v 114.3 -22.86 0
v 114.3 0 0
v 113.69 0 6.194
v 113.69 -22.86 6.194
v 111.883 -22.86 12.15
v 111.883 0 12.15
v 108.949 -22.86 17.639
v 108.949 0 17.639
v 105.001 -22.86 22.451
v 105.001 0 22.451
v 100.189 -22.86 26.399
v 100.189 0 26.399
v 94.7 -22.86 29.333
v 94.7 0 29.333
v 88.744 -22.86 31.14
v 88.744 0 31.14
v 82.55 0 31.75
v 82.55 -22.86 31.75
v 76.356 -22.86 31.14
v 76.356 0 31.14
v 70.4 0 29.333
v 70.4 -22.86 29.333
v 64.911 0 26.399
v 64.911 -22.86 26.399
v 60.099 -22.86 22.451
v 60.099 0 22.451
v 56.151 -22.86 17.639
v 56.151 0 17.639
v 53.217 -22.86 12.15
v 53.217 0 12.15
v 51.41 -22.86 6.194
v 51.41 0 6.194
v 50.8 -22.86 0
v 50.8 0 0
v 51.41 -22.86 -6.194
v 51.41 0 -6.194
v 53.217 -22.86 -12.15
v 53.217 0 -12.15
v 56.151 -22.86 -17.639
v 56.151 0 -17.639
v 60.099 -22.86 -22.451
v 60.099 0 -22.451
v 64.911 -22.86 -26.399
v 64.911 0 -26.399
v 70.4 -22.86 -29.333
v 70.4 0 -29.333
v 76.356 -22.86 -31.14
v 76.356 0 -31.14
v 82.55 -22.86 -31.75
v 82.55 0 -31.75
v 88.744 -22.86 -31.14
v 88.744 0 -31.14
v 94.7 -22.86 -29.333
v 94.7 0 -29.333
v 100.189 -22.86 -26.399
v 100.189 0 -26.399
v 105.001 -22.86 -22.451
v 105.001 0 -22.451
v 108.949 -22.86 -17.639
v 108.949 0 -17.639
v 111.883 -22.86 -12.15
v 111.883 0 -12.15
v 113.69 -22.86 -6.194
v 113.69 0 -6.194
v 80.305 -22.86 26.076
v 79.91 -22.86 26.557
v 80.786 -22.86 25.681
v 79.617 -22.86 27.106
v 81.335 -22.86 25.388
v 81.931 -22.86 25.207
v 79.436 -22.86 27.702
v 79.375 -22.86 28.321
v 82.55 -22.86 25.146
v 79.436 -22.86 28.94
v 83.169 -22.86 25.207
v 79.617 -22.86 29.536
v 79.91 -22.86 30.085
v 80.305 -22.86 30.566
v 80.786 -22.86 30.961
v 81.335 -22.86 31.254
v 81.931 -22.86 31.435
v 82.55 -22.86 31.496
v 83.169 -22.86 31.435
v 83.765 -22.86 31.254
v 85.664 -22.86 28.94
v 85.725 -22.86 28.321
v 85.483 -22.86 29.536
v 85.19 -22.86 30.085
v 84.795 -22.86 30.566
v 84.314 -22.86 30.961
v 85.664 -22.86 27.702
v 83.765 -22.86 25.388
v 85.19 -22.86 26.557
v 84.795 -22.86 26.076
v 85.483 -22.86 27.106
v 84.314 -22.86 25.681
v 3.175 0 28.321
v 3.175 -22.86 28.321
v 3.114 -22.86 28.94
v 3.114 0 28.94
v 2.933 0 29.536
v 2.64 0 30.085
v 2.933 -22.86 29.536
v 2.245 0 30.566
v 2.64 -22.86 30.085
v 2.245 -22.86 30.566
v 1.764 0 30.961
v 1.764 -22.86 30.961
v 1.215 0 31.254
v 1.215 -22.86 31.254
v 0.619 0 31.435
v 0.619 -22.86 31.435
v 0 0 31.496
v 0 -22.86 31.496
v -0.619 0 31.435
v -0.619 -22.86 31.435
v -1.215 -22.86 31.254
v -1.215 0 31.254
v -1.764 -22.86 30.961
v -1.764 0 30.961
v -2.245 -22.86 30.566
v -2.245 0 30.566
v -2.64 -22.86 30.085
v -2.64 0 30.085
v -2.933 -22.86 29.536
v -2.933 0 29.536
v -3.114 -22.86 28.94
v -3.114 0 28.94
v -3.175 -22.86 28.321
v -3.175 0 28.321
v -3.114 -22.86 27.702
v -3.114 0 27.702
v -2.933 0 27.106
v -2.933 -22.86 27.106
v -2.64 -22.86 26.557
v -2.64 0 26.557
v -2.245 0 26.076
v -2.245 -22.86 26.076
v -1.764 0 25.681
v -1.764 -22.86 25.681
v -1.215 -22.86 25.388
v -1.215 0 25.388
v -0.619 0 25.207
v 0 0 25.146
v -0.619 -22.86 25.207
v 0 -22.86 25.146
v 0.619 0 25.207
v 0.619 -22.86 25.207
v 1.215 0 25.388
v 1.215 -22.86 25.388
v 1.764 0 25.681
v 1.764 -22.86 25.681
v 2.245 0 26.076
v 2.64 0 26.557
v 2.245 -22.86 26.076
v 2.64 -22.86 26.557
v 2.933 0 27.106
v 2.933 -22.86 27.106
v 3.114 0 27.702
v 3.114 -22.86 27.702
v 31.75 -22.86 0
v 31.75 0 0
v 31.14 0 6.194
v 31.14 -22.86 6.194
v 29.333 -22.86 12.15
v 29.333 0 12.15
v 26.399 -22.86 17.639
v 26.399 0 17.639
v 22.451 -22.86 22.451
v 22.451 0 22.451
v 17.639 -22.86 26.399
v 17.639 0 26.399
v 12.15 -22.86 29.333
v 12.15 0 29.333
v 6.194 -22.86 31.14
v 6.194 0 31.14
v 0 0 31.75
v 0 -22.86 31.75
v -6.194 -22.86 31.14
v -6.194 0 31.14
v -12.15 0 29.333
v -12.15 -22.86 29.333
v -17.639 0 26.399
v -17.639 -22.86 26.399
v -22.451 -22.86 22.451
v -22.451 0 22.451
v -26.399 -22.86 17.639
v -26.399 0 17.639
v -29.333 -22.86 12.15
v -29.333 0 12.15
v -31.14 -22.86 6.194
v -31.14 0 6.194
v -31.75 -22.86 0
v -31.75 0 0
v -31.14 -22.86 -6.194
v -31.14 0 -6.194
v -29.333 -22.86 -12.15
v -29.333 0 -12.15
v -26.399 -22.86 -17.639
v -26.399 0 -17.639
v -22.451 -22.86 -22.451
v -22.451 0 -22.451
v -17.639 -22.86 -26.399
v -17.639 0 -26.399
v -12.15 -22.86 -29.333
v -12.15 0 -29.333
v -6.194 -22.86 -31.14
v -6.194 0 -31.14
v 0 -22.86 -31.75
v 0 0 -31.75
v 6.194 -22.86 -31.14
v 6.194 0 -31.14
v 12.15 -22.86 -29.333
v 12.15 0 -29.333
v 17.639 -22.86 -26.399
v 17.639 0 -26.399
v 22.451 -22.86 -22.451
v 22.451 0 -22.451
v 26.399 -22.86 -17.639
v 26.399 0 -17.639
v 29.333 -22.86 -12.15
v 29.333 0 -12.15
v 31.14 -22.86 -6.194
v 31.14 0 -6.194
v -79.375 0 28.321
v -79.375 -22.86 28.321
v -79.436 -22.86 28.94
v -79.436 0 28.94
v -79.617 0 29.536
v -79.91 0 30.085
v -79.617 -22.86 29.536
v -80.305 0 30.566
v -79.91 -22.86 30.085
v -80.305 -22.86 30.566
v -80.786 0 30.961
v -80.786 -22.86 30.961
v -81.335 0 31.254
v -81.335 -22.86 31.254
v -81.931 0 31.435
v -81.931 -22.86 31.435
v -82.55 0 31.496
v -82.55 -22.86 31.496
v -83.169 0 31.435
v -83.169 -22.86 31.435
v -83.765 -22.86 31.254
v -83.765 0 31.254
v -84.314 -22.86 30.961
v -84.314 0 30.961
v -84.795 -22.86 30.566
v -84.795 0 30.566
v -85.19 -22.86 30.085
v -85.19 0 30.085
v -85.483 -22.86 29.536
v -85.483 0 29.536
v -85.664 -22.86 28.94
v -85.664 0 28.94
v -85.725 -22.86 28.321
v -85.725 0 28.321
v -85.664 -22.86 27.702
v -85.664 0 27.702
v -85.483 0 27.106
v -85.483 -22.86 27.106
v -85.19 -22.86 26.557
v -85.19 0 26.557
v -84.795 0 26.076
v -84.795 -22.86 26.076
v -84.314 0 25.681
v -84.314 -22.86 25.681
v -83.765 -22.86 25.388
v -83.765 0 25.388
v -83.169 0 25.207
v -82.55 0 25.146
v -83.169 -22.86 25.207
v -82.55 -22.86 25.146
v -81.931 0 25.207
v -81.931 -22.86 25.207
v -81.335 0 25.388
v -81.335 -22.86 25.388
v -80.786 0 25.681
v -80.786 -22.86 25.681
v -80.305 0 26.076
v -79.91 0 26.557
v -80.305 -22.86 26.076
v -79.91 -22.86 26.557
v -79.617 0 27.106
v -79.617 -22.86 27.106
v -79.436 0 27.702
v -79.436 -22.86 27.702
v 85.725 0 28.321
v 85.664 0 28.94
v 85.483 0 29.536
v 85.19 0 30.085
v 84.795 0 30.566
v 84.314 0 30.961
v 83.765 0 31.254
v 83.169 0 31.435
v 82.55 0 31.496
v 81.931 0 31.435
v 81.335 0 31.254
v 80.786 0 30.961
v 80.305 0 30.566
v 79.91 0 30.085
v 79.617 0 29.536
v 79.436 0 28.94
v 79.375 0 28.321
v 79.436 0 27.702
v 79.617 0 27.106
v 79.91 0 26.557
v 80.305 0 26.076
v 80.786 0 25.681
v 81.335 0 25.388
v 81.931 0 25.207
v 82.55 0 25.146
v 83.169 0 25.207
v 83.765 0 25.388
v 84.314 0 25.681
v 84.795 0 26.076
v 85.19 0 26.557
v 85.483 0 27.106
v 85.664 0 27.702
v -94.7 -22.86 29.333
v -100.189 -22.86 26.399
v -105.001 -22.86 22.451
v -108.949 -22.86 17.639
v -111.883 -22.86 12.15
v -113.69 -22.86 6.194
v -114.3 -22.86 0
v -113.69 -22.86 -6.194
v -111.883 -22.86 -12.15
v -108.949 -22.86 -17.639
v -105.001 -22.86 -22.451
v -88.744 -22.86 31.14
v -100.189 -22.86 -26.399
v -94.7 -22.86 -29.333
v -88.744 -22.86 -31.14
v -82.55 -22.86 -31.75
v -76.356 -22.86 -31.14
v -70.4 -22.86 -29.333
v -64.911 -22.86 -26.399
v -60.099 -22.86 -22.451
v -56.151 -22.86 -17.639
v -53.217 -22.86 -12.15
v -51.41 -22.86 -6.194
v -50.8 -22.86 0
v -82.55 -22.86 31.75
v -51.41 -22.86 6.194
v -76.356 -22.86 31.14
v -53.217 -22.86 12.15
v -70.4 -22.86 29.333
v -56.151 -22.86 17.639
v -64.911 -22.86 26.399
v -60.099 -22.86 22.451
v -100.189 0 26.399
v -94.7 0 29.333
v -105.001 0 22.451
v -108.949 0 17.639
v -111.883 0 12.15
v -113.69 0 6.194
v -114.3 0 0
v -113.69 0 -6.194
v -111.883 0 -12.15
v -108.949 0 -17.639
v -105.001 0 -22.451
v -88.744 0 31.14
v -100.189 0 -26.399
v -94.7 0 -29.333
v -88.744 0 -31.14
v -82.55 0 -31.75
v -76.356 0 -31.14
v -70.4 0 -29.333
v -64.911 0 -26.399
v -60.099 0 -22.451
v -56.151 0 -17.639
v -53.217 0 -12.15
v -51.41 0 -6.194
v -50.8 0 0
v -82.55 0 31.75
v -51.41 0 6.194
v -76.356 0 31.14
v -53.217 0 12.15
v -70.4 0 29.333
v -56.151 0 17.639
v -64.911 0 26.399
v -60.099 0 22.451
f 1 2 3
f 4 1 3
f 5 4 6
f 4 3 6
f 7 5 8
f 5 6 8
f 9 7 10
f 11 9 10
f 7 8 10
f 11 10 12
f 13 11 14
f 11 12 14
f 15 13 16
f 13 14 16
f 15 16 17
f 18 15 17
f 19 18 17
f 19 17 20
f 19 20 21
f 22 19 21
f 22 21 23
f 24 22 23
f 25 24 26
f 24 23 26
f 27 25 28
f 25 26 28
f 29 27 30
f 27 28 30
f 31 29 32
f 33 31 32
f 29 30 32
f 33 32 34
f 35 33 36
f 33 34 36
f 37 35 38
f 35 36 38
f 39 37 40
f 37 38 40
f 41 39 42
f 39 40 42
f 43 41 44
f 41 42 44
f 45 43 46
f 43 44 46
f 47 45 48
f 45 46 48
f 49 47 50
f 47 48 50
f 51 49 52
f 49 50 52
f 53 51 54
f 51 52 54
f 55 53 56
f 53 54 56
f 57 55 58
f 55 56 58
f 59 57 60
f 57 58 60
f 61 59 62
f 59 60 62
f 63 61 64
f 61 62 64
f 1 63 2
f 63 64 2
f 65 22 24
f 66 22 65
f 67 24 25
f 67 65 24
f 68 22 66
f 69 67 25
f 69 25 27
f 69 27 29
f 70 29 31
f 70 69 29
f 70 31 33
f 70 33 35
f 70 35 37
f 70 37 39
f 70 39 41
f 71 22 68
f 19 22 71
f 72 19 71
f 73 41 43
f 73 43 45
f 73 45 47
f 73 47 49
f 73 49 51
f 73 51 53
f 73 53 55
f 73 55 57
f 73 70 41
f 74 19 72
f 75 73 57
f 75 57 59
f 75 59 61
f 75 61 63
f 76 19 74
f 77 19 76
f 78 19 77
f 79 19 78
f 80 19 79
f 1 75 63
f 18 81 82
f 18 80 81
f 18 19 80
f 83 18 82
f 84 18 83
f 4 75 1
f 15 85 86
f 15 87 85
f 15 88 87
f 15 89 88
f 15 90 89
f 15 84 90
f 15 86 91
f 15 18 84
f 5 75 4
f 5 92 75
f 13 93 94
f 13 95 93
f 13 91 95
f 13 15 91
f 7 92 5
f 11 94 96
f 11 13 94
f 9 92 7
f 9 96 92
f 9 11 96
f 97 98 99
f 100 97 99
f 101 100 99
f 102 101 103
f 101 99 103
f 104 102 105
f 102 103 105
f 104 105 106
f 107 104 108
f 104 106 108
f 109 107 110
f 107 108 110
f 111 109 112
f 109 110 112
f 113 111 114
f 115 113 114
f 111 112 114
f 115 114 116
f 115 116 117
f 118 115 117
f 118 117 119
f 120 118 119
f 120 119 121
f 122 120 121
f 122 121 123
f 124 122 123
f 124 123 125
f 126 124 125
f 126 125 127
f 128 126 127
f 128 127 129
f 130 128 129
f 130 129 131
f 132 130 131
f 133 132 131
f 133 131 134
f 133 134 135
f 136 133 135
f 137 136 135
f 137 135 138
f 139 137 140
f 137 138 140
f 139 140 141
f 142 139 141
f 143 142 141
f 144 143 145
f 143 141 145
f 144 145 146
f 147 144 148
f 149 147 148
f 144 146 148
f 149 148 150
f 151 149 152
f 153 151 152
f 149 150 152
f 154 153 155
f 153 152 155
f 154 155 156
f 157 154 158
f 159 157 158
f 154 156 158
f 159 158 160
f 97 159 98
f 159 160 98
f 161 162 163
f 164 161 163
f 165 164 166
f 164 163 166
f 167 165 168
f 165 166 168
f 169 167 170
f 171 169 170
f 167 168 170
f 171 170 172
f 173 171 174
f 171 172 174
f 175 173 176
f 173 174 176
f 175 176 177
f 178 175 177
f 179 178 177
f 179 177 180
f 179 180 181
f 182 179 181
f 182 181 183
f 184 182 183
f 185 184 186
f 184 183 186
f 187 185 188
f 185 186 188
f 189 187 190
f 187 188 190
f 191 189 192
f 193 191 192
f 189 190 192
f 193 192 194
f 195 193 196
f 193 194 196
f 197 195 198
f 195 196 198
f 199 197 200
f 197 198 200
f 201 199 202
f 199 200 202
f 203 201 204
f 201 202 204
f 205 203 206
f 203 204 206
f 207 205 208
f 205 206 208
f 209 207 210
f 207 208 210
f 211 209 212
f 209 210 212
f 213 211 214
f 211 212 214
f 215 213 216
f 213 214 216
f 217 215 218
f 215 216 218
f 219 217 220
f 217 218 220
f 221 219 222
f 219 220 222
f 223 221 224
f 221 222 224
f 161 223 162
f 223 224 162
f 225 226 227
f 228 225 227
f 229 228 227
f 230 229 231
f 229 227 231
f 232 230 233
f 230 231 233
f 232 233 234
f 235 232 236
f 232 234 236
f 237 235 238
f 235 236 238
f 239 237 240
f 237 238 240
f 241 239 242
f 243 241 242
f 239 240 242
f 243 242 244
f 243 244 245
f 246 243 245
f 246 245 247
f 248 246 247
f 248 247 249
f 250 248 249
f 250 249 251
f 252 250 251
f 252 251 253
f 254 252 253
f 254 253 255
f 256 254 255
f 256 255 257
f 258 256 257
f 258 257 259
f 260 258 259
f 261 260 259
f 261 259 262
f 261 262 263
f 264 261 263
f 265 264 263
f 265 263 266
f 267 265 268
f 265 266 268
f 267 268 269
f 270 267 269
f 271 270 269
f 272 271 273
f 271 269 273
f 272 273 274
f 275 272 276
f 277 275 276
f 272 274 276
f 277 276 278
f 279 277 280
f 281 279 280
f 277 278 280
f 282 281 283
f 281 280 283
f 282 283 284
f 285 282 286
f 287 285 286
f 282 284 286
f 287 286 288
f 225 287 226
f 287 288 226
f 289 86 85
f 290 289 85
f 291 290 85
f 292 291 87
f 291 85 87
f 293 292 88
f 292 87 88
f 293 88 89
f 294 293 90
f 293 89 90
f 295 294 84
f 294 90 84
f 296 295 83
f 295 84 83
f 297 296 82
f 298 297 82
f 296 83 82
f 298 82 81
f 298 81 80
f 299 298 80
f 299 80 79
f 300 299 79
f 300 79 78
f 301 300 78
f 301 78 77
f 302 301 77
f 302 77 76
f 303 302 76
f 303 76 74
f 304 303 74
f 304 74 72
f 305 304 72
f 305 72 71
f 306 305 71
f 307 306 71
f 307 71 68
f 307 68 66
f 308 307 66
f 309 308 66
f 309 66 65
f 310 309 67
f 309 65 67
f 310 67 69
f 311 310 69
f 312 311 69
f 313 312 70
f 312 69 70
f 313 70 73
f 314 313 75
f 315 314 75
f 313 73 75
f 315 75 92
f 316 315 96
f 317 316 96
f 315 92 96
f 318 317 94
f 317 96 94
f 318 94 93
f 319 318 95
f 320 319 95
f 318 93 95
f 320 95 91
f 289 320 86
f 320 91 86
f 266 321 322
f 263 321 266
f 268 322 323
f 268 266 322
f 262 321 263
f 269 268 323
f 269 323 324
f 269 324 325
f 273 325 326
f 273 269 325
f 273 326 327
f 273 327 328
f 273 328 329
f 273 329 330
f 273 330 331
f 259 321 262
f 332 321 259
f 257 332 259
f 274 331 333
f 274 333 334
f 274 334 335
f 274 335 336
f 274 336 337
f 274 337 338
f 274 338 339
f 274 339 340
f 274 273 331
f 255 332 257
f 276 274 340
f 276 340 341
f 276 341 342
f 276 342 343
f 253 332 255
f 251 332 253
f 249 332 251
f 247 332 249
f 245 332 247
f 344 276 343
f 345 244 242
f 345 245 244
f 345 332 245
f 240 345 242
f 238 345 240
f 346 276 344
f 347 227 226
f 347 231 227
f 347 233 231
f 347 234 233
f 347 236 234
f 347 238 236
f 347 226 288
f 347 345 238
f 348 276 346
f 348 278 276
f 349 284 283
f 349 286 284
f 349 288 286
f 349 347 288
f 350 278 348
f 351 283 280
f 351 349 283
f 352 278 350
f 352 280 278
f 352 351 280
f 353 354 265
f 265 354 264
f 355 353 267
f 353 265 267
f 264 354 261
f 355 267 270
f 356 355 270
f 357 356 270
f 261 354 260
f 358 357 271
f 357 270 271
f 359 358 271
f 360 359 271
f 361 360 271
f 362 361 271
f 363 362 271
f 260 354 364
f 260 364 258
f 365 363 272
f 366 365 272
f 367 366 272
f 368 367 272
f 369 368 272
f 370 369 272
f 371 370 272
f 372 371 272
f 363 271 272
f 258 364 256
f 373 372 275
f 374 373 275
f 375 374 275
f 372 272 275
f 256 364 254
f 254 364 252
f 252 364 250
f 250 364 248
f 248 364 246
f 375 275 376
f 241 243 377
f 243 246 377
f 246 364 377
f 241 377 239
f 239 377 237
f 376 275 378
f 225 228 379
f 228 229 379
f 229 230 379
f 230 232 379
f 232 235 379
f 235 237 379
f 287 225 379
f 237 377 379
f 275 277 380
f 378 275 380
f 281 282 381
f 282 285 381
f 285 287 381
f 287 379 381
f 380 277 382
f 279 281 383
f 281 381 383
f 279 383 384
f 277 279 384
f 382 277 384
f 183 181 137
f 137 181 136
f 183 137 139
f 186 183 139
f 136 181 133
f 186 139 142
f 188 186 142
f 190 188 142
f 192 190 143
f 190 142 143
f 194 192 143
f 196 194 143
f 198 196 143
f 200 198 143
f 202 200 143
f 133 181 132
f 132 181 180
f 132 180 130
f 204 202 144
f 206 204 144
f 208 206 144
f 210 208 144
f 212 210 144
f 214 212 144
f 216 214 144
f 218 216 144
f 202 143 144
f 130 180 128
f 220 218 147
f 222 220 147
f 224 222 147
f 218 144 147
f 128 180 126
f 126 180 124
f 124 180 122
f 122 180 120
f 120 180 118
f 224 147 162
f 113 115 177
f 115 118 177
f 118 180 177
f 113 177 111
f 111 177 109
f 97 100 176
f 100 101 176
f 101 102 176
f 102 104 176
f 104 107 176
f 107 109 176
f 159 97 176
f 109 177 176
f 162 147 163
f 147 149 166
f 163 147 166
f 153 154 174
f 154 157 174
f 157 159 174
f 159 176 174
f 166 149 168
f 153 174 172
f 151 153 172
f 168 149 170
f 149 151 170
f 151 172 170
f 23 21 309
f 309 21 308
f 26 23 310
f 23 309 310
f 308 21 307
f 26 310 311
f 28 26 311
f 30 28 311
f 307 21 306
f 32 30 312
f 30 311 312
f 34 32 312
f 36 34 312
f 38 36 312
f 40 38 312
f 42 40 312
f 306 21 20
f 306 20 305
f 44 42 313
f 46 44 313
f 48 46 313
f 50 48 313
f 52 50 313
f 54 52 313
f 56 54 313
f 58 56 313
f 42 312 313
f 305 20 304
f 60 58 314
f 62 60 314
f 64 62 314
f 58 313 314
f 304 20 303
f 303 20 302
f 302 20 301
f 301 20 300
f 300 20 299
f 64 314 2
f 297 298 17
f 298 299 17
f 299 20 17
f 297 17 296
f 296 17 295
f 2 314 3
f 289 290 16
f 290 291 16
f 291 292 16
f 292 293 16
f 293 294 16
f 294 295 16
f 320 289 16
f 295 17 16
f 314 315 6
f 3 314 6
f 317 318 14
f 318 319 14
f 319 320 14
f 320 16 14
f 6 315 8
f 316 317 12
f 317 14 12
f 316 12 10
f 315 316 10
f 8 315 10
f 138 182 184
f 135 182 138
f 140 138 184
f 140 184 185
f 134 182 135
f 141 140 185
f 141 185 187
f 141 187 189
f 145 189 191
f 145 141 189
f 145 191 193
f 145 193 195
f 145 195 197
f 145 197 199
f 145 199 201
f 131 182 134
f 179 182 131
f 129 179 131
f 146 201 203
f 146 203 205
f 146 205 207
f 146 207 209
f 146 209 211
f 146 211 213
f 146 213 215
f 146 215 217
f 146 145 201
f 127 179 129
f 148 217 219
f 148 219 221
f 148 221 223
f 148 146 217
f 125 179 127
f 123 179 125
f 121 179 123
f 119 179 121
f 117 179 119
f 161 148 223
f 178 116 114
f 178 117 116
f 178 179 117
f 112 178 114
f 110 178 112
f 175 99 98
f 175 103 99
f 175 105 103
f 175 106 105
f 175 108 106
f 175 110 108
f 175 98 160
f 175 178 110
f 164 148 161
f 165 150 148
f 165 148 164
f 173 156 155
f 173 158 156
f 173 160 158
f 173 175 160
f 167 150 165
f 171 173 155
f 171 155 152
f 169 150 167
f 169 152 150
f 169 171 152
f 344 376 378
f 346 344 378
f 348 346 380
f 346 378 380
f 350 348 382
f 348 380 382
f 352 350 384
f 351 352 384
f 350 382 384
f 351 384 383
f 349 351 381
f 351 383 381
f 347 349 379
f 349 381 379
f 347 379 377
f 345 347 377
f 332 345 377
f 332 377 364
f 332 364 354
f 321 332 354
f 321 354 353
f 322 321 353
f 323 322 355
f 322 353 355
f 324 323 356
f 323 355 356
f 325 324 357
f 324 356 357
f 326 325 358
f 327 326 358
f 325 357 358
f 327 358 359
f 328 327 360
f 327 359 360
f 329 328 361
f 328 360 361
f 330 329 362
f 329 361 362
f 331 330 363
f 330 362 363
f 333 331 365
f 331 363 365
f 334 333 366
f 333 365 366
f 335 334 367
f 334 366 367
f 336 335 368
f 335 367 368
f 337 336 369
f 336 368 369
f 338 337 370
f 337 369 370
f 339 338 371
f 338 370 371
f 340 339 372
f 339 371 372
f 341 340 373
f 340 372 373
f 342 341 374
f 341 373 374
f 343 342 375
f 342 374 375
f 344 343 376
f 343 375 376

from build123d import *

# Parameters (mm, degrees)
F0_R     = 31.75
F1_DEPTH = 22.86
F2_R     = 3.175
F3_DEPTH = 25.4
F4_DEPTH = 25.4
F5_DEPTH = 25.4


with BuildPart() as f1:
    # F0 (on Front) → F1 (new body)
    with BuildSketch(Plane.XZ):
        with Locations((-82.55, 0)):
            Circle(F0_R)
        Circle(F0_R)
        with Locations((82.55, 0)):
            Circle(F0_R)
    extrude(amount=F1_DEPTH)

    # F2 (on face) → F3 (cut)
    with BuildSketch(Plane.XZ.offset(22.86)):
        with Locations((-82.55, 28.321)):
            Circle(F2_R)
    extrude(amount=-F3_DEPTH, mode=Mode.SUBTRACT)

    # F2 (on face) → F4 (cut)
    with BuildSketch(Plane.XZ.offset(22.86)):
        with Locations((0, 28.321)):
            Circle(F2_R)
    extrude(amount=-F4_DEPTH, mode=Mode.SUBTRACT)

    # F2 (on face) → F5 (cut)
    with BuildSketch(Plane.XZ.offset(22.86)):
        with Locations((82.55, 28.321)):
            Circle(F2_R)
    extrude(amount=-F5_DEPTH, mode=Mode.SUBTRACT)


solid = f1.part
